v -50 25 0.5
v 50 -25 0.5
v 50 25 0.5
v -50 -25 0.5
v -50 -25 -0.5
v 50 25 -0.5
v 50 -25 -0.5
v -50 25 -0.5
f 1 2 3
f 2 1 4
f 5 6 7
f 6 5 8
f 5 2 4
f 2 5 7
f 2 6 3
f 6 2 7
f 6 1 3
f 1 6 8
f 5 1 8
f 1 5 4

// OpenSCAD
// Define higher resolution for transformations
$fn=60;


cube([100, 50 , 1], true);
